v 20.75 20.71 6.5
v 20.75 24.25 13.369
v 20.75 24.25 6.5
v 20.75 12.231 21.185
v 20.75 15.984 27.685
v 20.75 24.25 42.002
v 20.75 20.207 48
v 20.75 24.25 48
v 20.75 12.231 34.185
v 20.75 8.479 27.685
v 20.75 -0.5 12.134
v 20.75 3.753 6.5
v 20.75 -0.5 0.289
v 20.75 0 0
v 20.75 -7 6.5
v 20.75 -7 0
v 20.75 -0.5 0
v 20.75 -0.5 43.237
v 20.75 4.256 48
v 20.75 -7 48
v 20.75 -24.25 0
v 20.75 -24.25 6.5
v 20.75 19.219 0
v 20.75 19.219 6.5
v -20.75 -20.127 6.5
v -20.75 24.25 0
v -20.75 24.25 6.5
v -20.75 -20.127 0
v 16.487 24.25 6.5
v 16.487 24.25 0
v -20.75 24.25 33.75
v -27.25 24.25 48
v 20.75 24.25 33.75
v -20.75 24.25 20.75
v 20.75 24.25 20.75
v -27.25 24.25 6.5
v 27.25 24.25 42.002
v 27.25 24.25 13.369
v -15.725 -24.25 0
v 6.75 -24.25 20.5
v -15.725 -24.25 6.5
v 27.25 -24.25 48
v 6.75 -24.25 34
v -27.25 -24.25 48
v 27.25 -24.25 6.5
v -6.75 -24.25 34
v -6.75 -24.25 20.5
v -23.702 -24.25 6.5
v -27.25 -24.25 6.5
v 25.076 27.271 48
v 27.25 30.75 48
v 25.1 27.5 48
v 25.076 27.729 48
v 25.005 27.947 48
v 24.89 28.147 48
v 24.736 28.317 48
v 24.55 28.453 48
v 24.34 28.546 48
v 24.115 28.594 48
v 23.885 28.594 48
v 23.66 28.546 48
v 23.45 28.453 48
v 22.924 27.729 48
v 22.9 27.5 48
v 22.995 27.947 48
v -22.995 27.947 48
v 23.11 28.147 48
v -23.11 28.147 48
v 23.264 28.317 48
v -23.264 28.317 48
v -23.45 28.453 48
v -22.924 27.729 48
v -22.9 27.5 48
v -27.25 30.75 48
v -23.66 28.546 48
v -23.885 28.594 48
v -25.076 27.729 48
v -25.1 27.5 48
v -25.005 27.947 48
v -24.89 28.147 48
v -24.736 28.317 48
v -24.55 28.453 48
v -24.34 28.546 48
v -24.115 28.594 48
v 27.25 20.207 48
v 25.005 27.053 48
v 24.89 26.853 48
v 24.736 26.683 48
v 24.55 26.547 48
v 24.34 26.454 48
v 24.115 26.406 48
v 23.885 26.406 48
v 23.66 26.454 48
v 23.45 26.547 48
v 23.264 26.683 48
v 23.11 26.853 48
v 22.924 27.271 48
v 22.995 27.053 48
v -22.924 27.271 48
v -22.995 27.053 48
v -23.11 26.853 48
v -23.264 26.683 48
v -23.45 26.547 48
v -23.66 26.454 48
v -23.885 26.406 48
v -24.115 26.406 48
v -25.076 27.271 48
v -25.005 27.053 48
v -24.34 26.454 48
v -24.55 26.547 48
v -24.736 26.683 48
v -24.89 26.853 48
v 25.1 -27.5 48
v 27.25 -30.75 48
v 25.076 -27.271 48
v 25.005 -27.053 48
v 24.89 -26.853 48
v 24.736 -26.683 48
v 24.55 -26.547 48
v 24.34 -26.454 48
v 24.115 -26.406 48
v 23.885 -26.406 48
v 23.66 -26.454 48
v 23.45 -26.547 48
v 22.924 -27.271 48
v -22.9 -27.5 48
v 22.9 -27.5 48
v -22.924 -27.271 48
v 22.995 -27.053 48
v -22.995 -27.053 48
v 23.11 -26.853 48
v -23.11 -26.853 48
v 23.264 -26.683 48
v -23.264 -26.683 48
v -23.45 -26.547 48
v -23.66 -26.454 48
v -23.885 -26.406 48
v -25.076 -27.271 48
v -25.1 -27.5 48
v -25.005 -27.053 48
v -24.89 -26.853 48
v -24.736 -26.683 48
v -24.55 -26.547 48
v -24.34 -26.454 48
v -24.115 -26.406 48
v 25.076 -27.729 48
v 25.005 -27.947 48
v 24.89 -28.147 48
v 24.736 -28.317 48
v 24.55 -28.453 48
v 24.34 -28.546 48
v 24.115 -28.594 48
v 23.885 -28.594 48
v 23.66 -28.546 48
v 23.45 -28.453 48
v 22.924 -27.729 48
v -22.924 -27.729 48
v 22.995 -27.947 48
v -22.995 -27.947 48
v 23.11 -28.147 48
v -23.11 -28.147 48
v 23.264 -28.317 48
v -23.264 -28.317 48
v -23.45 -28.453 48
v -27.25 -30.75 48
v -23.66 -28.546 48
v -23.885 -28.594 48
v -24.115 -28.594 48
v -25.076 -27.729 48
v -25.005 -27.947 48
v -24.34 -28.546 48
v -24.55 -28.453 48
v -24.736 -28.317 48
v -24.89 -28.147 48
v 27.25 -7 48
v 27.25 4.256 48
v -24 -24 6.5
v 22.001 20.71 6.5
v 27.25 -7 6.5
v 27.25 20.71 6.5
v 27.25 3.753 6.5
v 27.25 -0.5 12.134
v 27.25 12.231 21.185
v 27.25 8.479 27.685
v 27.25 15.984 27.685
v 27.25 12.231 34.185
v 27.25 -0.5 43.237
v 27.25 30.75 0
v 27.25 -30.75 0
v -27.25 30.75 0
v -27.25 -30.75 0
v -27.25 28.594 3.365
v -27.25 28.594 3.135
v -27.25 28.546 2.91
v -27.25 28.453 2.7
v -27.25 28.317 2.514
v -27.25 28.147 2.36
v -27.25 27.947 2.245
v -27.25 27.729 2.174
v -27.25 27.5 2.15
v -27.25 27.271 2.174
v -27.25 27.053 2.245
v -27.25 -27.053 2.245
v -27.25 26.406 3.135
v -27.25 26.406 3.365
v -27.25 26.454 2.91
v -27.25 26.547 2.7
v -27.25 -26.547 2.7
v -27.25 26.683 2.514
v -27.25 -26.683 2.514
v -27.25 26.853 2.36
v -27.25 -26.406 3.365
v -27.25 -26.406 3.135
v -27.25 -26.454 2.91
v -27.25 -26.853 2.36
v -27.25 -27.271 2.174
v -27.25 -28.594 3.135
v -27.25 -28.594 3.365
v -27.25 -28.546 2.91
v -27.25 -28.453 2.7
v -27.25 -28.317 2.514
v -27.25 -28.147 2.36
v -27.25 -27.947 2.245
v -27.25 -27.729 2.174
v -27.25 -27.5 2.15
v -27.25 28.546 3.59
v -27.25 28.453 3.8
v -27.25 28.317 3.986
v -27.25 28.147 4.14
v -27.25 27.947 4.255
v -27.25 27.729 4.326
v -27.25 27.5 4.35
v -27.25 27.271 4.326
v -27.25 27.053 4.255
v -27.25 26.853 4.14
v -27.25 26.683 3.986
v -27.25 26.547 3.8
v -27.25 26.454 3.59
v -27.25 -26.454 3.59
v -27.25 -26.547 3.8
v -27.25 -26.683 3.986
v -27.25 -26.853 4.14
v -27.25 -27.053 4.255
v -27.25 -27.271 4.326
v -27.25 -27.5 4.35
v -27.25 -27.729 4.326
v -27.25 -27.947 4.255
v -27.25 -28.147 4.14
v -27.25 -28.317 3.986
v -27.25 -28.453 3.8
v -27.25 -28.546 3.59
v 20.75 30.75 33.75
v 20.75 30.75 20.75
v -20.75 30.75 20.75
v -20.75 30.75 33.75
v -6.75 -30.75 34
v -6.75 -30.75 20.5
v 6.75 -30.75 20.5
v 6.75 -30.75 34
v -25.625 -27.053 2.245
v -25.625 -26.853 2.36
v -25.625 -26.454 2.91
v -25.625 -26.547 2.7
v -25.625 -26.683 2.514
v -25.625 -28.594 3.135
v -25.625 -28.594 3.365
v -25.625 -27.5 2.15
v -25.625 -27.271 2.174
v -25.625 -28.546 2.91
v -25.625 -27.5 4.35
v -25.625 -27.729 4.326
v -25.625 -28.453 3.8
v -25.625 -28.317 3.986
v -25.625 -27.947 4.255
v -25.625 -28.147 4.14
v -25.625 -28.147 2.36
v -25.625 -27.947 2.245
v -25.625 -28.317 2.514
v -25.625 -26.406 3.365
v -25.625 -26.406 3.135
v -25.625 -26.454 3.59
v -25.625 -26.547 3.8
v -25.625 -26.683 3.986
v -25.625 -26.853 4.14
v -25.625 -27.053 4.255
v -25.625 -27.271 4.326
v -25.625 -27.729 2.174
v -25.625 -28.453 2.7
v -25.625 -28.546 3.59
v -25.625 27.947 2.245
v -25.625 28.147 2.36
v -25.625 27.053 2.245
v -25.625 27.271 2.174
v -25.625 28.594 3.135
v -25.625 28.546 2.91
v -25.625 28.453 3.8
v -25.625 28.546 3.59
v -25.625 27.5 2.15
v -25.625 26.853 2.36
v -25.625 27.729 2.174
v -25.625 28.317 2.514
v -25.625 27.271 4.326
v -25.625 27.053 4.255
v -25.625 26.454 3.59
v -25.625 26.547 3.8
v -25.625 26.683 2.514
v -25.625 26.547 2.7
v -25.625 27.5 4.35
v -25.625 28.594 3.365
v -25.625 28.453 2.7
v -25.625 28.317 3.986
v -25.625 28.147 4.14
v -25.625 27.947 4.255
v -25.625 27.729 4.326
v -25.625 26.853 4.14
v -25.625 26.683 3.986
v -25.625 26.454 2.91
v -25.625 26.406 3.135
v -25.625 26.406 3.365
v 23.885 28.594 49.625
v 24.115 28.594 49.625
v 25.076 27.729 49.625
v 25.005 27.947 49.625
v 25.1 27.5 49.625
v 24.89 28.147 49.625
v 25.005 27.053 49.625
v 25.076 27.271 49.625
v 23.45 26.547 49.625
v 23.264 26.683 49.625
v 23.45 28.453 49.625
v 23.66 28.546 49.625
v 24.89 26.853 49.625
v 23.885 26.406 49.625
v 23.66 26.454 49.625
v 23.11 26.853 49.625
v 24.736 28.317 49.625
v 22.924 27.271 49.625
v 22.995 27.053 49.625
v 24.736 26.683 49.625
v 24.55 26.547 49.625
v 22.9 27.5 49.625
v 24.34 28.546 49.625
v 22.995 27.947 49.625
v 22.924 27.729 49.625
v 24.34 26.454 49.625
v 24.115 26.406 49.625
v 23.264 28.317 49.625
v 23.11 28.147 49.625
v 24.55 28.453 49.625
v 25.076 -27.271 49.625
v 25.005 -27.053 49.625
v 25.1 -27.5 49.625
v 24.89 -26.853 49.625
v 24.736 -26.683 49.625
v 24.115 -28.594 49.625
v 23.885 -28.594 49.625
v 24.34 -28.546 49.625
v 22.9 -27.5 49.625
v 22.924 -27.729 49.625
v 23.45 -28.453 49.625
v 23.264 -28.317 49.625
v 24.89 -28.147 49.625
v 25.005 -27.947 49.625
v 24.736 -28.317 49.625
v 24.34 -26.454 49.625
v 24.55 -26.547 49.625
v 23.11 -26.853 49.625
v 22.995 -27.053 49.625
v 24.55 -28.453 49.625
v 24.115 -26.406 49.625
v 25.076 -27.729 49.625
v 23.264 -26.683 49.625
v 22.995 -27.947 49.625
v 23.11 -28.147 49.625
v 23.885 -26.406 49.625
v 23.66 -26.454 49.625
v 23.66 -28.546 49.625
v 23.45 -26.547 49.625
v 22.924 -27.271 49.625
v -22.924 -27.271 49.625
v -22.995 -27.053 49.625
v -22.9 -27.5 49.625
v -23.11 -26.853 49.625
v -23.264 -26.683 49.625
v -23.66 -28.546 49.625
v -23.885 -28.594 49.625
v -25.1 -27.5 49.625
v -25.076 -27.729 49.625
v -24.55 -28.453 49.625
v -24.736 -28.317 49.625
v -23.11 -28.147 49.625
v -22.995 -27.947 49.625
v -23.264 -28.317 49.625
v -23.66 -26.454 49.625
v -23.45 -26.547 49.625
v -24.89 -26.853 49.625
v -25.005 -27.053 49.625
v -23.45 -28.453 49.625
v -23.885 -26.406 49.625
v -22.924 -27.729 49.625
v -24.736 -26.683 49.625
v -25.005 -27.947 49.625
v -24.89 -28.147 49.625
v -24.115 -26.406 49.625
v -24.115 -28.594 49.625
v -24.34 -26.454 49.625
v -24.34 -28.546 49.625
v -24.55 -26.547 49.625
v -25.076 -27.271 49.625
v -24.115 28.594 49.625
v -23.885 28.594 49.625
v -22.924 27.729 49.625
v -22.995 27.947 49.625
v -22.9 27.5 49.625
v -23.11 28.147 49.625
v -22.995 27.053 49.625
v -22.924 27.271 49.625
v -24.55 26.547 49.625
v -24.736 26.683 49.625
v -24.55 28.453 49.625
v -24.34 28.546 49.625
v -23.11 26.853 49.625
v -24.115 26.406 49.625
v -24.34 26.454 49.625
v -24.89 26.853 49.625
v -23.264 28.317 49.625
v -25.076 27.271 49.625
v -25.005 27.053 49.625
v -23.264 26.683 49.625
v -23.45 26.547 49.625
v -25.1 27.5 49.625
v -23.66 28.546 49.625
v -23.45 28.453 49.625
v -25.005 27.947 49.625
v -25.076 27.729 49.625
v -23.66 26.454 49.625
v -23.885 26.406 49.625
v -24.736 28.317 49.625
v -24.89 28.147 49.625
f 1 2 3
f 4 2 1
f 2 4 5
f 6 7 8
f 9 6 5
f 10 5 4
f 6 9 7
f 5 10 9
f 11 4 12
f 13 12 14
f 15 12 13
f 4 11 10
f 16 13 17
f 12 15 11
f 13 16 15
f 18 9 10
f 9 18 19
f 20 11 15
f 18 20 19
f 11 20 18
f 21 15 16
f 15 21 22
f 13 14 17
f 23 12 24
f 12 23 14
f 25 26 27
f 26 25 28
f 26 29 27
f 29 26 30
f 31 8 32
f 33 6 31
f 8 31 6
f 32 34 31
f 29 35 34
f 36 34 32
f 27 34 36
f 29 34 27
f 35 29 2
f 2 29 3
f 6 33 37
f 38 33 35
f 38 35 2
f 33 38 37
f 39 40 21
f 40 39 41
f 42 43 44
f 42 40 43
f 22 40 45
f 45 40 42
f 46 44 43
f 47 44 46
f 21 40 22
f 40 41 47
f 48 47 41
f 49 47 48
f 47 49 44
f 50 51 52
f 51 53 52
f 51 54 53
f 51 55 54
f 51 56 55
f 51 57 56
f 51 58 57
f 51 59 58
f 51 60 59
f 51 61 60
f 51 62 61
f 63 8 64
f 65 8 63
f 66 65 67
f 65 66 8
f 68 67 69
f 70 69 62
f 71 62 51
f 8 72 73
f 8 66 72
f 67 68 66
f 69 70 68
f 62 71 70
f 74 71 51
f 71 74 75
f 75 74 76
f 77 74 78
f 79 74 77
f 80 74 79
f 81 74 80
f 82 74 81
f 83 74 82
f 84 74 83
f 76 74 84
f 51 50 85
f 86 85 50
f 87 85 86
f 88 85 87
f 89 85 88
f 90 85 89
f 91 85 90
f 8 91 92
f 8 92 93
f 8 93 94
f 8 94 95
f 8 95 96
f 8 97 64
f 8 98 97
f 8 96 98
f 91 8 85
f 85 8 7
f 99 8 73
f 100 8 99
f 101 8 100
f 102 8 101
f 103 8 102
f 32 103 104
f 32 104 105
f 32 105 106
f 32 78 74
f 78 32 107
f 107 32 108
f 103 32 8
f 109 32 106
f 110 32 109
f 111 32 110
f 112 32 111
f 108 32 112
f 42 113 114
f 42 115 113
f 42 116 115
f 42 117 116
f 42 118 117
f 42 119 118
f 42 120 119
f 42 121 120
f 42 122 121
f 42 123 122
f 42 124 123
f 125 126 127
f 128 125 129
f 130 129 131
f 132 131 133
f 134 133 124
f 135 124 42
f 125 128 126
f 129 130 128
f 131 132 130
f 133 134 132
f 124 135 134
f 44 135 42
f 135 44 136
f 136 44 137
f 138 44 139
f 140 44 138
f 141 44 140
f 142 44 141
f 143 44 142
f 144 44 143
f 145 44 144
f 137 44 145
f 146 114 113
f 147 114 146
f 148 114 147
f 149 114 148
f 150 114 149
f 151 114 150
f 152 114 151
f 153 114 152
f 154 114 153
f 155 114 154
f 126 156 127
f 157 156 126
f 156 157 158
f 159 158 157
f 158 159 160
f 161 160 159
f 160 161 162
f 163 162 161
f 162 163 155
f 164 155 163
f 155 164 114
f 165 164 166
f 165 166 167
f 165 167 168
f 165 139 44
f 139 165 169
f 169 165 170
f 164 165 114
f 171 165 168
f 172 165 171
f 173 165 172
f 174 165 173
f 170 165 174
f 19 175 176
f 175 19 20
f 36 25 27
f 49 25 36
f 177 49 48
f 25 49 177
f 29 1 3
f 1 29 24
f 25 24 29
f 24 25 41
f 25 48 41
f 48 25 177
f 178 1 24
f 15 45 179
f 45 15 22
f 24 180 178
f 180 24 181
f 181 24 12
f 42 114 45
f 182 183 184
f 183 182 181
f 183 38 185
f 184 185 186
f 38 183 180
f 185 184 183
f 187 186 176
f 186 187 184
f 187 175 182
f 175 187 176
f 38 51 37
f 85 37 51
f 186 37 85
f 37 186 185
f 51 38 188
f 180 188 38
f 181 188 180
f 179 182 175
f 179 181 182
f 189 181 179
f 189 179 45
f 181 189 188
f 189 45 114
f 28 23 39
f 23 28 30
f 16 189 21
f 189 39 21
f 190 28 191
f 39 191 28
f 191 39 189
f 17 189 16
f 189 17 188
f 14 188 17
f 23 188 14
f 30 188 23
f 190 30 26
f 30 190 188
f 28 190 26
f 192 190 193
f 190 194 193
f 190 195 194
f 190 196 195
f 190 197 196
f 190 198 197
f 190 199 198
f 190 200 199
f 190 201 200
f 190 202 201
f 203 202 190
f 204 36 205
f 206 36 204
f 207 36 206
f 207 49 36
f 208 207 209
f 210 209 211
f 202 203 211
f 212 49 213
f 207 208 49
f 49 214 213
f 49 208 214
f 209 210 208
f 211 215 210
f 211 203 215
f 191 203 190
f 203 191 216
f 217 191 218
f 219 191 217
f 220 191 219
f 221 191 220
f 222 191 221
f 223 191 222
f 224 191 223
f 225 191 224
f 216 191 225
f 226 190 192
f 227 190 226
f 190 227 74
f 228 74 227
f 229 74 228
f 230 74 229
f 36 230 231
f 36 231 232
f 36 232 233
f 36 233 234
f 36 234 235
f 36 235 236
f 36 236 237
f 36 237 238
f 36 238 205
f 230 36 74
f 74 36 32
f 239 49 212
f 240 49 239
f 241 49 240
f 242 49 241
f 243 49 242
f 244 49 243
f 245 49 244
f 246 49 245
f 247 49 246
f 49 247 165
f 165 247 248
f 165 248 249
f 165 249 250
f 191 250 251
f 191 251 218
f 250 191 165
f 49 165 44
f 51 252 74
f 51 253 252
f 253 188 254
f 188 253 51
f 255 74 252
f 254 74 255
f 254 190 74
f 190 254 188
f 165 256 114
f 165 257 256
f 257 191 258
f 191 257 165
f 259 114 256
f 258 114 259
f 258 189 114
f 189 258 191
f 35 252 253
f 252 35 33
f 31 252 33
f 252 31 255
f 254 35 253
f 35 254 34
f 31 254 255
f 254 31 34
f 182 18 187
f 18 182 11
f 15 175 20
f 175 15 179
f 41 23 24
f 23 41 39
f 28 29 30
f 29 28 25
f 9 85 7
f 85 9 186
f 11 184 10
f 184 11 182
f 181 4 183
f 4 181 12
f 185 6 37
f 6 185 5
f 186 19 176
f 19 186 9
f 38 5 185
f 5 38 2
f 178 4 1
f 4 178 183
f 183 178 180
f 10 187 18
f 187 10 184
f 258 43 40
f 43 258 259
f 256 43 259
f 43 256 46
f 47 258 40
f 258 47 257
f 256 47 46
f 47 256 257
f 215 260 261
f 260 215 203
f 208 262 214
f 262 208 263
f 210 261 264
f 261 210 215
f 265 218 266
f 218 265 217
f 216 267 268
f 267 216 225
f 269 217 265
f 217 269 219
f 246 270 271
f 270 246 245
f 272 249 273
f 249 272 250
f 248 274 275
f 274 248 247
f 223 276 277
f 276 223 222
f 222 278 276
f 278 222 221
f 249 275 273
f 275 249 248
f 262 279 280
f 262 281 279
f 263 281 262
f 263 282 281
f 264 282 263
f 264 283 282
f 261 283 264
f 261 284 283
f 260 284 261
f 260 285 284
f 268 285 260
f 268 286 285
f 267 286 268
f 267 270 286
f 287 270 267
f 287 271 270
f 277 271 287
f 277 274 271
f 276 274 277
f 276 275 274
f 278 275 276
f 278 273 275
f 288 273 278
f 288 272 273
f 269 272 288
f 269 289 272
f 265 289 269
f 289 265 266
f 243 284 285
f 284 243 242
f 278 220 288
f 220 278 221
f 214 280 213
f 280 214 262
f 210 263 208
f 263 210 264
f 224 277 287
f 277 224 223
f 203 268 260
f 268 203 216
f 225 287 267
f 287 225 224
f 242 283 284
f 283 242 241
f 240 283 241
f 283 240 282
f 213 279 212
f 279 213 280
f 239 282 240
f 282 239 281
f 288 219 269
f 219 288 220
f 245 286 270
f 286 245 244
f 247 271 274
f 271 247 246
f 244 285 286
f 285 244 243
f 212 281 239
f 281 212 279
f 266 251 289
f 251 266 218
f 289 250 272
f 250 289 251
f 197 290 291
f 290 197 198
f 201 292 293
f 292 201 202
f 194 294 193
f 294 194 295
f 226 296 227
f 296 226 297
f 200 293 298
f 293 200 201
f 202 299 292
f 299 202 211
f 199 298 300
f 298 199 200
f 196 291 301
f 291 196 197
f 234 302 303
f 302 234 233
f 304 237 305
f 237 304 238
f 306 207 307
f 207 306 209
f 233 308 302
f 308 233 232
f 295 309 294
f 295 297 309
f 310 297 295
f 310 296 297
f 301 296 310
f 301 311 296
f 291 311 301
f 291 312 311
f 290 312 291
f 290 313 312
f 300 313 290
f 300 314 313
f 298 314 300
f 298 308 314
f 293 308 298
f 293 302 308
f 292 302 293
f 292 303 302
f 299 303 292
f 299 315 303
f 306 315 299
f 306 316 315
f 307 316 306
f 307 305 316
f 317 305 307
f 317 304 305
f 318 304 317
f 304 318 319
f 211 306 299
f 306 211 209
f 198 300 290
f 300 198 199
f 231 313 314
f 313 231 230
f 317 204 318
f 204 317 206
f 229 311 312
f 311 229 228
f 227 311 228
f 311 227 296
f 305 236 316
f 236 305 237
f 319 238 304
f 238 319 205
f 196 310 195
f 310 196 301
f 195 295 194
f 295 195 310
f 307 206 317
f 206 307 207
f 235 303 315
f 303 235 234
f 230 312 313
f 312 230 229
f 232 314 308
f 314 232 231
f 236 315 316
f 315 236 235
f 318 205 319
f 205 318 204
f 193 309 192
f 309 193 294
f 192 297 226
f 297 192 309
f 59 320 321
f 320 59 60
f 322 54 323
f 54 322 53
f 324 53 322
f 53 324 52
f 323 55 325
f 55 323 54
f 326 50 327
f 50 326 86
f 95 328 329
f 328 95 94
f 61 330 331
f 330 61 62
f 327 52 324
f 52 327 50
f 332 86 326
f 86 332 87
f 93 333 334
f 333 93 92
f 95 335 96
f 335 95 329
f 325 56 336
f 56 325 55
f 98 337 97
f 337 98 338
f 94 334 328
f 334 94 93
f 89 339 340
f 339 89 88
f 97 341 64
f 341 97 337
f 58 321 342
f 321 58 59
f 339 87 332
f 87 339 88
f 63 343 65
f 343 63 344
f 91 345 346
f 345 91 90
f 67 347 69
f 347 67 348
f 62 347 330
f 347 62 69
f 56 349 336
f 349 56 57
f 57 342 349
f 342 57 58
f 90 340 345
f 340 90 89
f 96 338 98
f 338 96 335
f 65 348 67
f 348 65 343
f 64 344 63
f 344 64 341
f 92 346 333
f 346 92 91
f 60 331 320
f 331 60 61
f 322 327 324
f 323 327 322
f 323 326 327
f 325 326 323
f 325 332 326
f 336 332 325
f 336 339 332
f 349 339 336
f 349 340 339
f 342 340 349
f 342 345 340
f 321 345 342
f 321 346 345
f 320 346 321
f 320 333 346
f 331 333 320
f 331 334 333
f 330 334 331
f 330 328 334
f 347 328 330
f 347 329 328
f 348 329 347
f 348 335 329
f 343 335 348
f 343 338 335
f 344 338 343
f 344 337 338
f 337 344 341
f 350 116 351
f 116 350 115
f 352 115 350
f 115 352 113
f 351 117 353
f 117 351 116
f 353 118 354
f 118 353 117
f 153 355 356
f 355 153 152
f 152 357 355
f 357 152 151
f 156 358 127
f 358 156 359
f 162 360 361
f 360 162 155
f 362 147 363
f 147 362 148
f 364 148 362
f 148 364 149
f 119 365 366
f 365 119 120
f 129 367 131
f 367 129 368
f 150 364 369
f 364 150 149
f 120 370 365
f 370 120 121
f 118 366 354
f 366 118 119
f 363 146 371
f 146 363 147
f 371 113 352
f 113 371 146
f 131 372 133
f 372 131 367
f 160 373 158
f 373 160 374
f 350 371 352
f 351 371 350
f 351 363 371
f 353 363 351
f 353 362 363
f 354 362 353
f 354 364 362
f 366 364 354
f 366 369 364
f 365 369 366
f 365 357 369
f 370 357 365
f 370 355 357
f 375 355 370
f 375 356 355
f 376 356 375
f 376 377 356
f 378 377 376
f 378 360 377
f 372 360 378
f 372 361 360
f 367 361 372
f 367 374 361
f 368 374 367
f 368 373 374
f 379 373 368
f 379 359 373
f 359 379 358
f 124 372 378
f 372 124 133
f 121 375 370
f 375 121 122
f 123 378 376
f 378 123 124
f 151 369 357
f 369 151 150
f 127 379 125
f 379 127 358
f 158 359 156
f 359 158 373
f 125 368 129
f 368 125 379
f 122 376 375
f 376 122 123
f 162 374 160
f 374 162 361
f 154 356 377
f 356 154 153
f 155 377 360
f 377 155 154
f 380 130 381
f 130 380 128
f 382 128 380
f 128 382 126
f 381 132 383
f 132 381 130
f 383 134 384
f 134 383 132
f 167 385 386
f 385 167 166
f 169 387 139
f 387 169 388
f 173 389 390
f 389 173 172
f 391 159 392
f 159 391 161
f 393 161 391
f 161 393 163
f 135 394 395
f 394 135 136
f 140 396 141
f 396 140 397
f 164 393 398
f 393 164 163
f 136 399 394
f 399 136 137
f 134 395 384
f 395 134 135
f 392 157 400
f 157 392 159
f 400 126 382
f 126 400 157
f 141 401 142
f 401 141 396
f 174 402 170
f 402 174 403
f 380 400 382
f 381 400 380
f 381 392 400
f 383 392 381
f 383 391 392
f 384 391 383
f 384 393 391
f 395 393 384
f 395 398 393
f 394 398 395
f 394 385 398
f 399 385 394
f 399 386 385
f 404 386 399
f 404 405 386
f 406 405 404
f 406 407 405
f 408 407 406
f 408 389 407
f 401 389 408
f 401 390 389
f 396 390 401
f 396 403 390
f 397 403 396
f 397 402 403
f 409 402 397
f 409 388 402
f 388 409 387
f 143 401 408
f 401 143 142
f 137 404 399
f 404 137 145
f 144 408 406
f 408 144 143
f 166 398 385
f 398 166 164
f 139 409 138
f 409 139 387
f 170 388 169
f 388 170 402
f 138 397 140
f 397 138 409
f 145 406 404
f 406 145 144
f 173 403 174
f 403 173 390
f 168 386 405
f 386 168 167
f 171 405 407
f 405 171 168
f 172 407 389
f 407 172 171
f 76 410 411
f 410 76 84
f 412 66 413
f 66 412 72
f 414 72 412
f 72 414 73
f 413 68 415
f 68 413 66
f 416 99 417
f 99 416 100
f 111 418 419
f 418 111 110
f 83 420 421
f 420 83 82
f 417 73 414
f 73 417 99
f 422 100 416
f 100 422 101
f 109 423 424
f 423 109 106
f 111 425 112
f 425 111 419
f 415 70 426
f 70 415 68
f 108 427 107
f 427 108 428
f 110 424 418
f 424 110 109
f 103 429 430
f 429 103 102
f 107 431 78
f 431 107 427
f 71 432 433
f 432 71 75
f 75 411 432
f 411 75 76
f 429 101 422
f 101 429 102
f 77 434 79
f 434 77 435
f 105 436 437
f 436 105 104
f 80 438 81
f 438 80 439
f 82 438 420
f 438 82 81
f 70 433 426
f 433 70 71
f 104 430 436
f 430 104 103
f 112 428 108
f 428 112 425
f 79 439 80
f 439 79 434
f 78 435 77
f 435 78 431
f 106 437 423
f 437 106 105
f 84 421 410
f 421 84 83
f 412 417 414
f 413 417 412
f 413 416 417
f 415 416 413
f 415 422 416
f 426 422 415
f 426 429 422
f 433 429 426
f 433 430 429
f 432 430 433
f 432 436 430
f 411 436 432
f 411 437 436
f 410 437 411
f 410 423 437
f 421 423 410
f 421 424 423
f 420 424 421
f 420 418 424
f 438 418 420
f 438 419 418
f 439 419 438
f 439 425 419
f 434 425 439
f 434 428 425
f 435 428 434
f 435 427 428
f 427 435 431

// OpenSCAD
//arm_body.scad
//Laurin Fisher
//Makes the holding for the servos along the arm, the arm itself. Units are in Milimeters. 

error = 0.5; 
$fn = 30; 

//The wrist dimensions
side_wall_depth = 6 + error; 

wrist_width = 41 + side_wall_depth*2 + error; 
wrist_length = 48 + side_wall_depth*2 + error; 
wrist_height = wrist_width; 

//Servo dimensions
servo_width = 41 + error; 
servo_length = 20 + error; 

difference(){
union(){
difference(){
union(){
difference(){
union(){ 
difference(){
//Make the cube/holding 
translate([-wrist_width/2, -wrist_length/2, 0])
    cube([wrist_width, wrist_length, wrist_height]); 

//Cut out the sides and middle of the cube for lightness
union(){
translate([-(wrist_width-side_wall_depth*2)/2,-(wrist_length-side_wall_depth*2)/2, -1])
    cube([wrist_width-side_wall_depth*2, wrist_length-side_wall_depth*2, 100]); //100 = arbitrary big number
    
translate([-50,-(wrist_length-side_wall_depth*2)/2, side_wall_depth])
    cube([100, wrist_length-side_wall_depth*2, wrist_height-side_wall_depth*2]); 
}
}
}

translate([-servo_width/2, -servo_length/2 + wrist_length/2, -side_wall_depth + wrist_height/2])
    cube([servo_width, servo_length, side_wall_depth*2]); 
}

//Make the side opening for the bottom servo
side_wall_servo_hole_y = -wrist_length/2 + side_wall_depth + servo_length; 
translate([-side_wall_depth/2 + wrist_width/2 -error*6.5, -side_wall_depth/2 + side_wall_servo_hole_y , 0])
    cube([side_wall_depth, side_wall_depth, wrist_height]); 

//Make the supports
//Bottom side 

translate([-wrist_width/2+side_wall_depth/2, -wrist_height/2+ side_wall_depth/2, 0])
rotate([0,0,-40])
    cube([side_wall_depth, wrist_height + side_wall_depth*2, side_wall_depth]);

//Top Side

translate([-wrist_width/2+side_wall_depth/2, -wrist_height/2+ side_wall_depth/2, wrist_height-side_wall_depth])
rotate([0,0,-40])
    cube([side_wall_depth, wrist_height + side_wall_depth*2, side_wall_depth]);
    
//Side w/ Servo
rotate([60,0,0])
translate([wrist_width/2-side_wall_depth, 0, 0])
    cube([side_wall_depth, wrist_height, side_wall_depth]); 
    

translate([wrist_width/2-side_wall_depth, -side_wall_depth/2, wrist_height-side_wall_depth])
rotate([-60,0,0])
    cube([side_wall_depth, wrist_height, side_wall_depth]);
}

//Make the bottom opening for the wires
wire_cube_size = 13 + error; 
translate([-wire_cube_size/2, -wire_cube_size/2 - wrist_length/2, -wire_cube_size/2 + wrist_height/2])
cube([wire_cube_size,wire_cube_size,wire_cube_size]); 


//Make the opening for the pegs on the left side
rad_error = 0.1; 
//Bottom Right when facing side
translate([-wrist_width/2 - side_wall_depth/4, -wrist_length/2 + side_wall_depth/2, side_wall_depth/2])
rotate([0,90,0])
cylinder(side_wall_depth/2, 1+rad_error, 1+rad_error); 

//Top Right
translate([-wrist_width/2 - side_wall_depth/4, -wrist_length/2 + side_wall_depth/2, wrist_height-side_wall_depth/2])
rotate([0,90,0])
cylinder(side_wall_depth/2, 1+rad_error, 1+rad_error); 

//Top Left
translate([-wrist_width/2 - side_wall_depth/4, wrist_length/2 - side_wall_depth/2, wrist_height-side_wall_depth/2])
rotate([0,90,0])
cylinder(side_wall_depth/2, 1+rad_error, 1+rad_error); 

//Bottom Left
translate([-wrist_width/2 - side_wall_depth/4, wrist_length/2 - side_wall_depth/2, side_wall_depth/2])
rotate([0,90,0])
cylinder(side_wall_depth/2, 1+rad_error, 1+rad_error); 


}
}
/*
// TOP OF THE WRIST BOX
translate([-wrist_width, -wrist_length, -side_wall_depth])
cube([wrist_width*2, wrist_length*2, wrist_height]); 

//Make the pegs
rad_error = 0.1; 
//Top Right
translate([wrist_width/2-side_wall_depth/2, wrist_length/2- side_wall_depth/2, wrist_height - side_wall_depth])
cylinder(side_wall_depth/2, 1+rad_error, 1+rad_error); 

//Bottom Right
translate([wrist_width/2-side_wall_depth/2, -wrist_length/2 + side_wall_depth/2, wrist_height - side_wall_depth])
cylinder(side_wall_depth/2, 1+rad_error, 1+rad_error); 

//Bottom Left
translate([-wrist_width/2+side_wall_depth/2, -wrist_length/2 + side_wall_depth/2, wrist_height - side_wall_depth])
cylinder(side_wall_depth/2, 1+rad_error, 1+rad_error); 

//Top Left
translate([-wrist_width/2+side_wall_depth/2, wrist_length/2 - side_wall_depth/2, wrist_height - side_wall_depth])
cylinder(side_wall_depth/2, 1+rad_error, 1+rad_error); 

*/
translate([-wrist_width/2 -0.5, -wrist_length/2 -0.5, wrist_height - side_wall_depth])
cube([wrist_width +1, wrist_length+1, wrist_height]); 

}

rad_error = 0.1; 
//Top Right
translate([wrist_width/2-side_wall_depth/2, wrist_length/2- side_wall_depth/2, wrist_height - side_wall_depth -side_wall_depth/4])
cylinder(side_wall_depth/2, 1+rad_error, 1+rad_error); 

//Bottom Right
translate([wrist_width/2-side_wall_depth/2, -wrist_length/2 + side_wall_depth/2, wrist_height - side_wall_depth -side_wall_depth/4])
cylinder(side_wall_depth/2, 1+rad_error, 1+rad_error); 

//Bottom Left
translate([-wrist_width/2+side_wall_depth/2, -wrist_length/2 + side_wall_depth/2, wrist_height - side_wall_depth -side_wall_depth/4])
cylinder(side_wall_depth/2, 1+rad_error, 1+rad_error); 

//Top Left
translate([-wrist_width/2+side_wall_depth/2, wrist_length/2 - side_wall_depth/2, wrist_height - side_wall_depth -side_wall_depth/4])
cylinder(side_wall_depth/2, 1+rad_error, 1+rad_error); 


/*
//The removable side?

//Bottom Right when facing side
translate([-side_wall_depth/2 - wrist_width/2 -15 + side_wall_depth - side_wall_depth/4, -wrist_length/2 + side_wall_depth/2, side_wall_depth/2])
rotate([0,90,0])
cylinder(side_wall_depth/2, 1, 1); 

//Top Right
translate([-side_wall_depth/2 - wrist_width/2 -15 + side_wall_depth - side_wall_depth/4, -wrist_length/2 + side_wall_depth/2, wrist_height-side_wall_depth/2])
rotate([0,90,0])
cylinder(side_wall_depth/2, 1, 1); 

//Top Left
translate([-side_wall_depth/2 - wrist_width/2 -15 + side_wall_depth - side_wall_depth/4, wrist_length/2 - side_wall_depth/2, wrist_height-side_wall_depth/2])
rotate([0,90,0])
cylinder(side_wall_depth/2, 1, 1); 

//Bottom Left
translate([-side_wall_depth/2 - wrist_width/2 -15 + side_wall_depth - side_wall_depth/4, wrist_length/2 - side_wall_depth/2, side_wall_depth/2])
rotate([0,90,0])
cylinder(side_wall_depth/2, 1, 1); 

//Make the removable side wall
translate([-side_wall_depth/2 - wrist_width/2 -15 +side_wall_depth/2, -wrist_length/2, 0])
cube([side_wall_depth/2, wrist_length, wrist_height]); 
*/
